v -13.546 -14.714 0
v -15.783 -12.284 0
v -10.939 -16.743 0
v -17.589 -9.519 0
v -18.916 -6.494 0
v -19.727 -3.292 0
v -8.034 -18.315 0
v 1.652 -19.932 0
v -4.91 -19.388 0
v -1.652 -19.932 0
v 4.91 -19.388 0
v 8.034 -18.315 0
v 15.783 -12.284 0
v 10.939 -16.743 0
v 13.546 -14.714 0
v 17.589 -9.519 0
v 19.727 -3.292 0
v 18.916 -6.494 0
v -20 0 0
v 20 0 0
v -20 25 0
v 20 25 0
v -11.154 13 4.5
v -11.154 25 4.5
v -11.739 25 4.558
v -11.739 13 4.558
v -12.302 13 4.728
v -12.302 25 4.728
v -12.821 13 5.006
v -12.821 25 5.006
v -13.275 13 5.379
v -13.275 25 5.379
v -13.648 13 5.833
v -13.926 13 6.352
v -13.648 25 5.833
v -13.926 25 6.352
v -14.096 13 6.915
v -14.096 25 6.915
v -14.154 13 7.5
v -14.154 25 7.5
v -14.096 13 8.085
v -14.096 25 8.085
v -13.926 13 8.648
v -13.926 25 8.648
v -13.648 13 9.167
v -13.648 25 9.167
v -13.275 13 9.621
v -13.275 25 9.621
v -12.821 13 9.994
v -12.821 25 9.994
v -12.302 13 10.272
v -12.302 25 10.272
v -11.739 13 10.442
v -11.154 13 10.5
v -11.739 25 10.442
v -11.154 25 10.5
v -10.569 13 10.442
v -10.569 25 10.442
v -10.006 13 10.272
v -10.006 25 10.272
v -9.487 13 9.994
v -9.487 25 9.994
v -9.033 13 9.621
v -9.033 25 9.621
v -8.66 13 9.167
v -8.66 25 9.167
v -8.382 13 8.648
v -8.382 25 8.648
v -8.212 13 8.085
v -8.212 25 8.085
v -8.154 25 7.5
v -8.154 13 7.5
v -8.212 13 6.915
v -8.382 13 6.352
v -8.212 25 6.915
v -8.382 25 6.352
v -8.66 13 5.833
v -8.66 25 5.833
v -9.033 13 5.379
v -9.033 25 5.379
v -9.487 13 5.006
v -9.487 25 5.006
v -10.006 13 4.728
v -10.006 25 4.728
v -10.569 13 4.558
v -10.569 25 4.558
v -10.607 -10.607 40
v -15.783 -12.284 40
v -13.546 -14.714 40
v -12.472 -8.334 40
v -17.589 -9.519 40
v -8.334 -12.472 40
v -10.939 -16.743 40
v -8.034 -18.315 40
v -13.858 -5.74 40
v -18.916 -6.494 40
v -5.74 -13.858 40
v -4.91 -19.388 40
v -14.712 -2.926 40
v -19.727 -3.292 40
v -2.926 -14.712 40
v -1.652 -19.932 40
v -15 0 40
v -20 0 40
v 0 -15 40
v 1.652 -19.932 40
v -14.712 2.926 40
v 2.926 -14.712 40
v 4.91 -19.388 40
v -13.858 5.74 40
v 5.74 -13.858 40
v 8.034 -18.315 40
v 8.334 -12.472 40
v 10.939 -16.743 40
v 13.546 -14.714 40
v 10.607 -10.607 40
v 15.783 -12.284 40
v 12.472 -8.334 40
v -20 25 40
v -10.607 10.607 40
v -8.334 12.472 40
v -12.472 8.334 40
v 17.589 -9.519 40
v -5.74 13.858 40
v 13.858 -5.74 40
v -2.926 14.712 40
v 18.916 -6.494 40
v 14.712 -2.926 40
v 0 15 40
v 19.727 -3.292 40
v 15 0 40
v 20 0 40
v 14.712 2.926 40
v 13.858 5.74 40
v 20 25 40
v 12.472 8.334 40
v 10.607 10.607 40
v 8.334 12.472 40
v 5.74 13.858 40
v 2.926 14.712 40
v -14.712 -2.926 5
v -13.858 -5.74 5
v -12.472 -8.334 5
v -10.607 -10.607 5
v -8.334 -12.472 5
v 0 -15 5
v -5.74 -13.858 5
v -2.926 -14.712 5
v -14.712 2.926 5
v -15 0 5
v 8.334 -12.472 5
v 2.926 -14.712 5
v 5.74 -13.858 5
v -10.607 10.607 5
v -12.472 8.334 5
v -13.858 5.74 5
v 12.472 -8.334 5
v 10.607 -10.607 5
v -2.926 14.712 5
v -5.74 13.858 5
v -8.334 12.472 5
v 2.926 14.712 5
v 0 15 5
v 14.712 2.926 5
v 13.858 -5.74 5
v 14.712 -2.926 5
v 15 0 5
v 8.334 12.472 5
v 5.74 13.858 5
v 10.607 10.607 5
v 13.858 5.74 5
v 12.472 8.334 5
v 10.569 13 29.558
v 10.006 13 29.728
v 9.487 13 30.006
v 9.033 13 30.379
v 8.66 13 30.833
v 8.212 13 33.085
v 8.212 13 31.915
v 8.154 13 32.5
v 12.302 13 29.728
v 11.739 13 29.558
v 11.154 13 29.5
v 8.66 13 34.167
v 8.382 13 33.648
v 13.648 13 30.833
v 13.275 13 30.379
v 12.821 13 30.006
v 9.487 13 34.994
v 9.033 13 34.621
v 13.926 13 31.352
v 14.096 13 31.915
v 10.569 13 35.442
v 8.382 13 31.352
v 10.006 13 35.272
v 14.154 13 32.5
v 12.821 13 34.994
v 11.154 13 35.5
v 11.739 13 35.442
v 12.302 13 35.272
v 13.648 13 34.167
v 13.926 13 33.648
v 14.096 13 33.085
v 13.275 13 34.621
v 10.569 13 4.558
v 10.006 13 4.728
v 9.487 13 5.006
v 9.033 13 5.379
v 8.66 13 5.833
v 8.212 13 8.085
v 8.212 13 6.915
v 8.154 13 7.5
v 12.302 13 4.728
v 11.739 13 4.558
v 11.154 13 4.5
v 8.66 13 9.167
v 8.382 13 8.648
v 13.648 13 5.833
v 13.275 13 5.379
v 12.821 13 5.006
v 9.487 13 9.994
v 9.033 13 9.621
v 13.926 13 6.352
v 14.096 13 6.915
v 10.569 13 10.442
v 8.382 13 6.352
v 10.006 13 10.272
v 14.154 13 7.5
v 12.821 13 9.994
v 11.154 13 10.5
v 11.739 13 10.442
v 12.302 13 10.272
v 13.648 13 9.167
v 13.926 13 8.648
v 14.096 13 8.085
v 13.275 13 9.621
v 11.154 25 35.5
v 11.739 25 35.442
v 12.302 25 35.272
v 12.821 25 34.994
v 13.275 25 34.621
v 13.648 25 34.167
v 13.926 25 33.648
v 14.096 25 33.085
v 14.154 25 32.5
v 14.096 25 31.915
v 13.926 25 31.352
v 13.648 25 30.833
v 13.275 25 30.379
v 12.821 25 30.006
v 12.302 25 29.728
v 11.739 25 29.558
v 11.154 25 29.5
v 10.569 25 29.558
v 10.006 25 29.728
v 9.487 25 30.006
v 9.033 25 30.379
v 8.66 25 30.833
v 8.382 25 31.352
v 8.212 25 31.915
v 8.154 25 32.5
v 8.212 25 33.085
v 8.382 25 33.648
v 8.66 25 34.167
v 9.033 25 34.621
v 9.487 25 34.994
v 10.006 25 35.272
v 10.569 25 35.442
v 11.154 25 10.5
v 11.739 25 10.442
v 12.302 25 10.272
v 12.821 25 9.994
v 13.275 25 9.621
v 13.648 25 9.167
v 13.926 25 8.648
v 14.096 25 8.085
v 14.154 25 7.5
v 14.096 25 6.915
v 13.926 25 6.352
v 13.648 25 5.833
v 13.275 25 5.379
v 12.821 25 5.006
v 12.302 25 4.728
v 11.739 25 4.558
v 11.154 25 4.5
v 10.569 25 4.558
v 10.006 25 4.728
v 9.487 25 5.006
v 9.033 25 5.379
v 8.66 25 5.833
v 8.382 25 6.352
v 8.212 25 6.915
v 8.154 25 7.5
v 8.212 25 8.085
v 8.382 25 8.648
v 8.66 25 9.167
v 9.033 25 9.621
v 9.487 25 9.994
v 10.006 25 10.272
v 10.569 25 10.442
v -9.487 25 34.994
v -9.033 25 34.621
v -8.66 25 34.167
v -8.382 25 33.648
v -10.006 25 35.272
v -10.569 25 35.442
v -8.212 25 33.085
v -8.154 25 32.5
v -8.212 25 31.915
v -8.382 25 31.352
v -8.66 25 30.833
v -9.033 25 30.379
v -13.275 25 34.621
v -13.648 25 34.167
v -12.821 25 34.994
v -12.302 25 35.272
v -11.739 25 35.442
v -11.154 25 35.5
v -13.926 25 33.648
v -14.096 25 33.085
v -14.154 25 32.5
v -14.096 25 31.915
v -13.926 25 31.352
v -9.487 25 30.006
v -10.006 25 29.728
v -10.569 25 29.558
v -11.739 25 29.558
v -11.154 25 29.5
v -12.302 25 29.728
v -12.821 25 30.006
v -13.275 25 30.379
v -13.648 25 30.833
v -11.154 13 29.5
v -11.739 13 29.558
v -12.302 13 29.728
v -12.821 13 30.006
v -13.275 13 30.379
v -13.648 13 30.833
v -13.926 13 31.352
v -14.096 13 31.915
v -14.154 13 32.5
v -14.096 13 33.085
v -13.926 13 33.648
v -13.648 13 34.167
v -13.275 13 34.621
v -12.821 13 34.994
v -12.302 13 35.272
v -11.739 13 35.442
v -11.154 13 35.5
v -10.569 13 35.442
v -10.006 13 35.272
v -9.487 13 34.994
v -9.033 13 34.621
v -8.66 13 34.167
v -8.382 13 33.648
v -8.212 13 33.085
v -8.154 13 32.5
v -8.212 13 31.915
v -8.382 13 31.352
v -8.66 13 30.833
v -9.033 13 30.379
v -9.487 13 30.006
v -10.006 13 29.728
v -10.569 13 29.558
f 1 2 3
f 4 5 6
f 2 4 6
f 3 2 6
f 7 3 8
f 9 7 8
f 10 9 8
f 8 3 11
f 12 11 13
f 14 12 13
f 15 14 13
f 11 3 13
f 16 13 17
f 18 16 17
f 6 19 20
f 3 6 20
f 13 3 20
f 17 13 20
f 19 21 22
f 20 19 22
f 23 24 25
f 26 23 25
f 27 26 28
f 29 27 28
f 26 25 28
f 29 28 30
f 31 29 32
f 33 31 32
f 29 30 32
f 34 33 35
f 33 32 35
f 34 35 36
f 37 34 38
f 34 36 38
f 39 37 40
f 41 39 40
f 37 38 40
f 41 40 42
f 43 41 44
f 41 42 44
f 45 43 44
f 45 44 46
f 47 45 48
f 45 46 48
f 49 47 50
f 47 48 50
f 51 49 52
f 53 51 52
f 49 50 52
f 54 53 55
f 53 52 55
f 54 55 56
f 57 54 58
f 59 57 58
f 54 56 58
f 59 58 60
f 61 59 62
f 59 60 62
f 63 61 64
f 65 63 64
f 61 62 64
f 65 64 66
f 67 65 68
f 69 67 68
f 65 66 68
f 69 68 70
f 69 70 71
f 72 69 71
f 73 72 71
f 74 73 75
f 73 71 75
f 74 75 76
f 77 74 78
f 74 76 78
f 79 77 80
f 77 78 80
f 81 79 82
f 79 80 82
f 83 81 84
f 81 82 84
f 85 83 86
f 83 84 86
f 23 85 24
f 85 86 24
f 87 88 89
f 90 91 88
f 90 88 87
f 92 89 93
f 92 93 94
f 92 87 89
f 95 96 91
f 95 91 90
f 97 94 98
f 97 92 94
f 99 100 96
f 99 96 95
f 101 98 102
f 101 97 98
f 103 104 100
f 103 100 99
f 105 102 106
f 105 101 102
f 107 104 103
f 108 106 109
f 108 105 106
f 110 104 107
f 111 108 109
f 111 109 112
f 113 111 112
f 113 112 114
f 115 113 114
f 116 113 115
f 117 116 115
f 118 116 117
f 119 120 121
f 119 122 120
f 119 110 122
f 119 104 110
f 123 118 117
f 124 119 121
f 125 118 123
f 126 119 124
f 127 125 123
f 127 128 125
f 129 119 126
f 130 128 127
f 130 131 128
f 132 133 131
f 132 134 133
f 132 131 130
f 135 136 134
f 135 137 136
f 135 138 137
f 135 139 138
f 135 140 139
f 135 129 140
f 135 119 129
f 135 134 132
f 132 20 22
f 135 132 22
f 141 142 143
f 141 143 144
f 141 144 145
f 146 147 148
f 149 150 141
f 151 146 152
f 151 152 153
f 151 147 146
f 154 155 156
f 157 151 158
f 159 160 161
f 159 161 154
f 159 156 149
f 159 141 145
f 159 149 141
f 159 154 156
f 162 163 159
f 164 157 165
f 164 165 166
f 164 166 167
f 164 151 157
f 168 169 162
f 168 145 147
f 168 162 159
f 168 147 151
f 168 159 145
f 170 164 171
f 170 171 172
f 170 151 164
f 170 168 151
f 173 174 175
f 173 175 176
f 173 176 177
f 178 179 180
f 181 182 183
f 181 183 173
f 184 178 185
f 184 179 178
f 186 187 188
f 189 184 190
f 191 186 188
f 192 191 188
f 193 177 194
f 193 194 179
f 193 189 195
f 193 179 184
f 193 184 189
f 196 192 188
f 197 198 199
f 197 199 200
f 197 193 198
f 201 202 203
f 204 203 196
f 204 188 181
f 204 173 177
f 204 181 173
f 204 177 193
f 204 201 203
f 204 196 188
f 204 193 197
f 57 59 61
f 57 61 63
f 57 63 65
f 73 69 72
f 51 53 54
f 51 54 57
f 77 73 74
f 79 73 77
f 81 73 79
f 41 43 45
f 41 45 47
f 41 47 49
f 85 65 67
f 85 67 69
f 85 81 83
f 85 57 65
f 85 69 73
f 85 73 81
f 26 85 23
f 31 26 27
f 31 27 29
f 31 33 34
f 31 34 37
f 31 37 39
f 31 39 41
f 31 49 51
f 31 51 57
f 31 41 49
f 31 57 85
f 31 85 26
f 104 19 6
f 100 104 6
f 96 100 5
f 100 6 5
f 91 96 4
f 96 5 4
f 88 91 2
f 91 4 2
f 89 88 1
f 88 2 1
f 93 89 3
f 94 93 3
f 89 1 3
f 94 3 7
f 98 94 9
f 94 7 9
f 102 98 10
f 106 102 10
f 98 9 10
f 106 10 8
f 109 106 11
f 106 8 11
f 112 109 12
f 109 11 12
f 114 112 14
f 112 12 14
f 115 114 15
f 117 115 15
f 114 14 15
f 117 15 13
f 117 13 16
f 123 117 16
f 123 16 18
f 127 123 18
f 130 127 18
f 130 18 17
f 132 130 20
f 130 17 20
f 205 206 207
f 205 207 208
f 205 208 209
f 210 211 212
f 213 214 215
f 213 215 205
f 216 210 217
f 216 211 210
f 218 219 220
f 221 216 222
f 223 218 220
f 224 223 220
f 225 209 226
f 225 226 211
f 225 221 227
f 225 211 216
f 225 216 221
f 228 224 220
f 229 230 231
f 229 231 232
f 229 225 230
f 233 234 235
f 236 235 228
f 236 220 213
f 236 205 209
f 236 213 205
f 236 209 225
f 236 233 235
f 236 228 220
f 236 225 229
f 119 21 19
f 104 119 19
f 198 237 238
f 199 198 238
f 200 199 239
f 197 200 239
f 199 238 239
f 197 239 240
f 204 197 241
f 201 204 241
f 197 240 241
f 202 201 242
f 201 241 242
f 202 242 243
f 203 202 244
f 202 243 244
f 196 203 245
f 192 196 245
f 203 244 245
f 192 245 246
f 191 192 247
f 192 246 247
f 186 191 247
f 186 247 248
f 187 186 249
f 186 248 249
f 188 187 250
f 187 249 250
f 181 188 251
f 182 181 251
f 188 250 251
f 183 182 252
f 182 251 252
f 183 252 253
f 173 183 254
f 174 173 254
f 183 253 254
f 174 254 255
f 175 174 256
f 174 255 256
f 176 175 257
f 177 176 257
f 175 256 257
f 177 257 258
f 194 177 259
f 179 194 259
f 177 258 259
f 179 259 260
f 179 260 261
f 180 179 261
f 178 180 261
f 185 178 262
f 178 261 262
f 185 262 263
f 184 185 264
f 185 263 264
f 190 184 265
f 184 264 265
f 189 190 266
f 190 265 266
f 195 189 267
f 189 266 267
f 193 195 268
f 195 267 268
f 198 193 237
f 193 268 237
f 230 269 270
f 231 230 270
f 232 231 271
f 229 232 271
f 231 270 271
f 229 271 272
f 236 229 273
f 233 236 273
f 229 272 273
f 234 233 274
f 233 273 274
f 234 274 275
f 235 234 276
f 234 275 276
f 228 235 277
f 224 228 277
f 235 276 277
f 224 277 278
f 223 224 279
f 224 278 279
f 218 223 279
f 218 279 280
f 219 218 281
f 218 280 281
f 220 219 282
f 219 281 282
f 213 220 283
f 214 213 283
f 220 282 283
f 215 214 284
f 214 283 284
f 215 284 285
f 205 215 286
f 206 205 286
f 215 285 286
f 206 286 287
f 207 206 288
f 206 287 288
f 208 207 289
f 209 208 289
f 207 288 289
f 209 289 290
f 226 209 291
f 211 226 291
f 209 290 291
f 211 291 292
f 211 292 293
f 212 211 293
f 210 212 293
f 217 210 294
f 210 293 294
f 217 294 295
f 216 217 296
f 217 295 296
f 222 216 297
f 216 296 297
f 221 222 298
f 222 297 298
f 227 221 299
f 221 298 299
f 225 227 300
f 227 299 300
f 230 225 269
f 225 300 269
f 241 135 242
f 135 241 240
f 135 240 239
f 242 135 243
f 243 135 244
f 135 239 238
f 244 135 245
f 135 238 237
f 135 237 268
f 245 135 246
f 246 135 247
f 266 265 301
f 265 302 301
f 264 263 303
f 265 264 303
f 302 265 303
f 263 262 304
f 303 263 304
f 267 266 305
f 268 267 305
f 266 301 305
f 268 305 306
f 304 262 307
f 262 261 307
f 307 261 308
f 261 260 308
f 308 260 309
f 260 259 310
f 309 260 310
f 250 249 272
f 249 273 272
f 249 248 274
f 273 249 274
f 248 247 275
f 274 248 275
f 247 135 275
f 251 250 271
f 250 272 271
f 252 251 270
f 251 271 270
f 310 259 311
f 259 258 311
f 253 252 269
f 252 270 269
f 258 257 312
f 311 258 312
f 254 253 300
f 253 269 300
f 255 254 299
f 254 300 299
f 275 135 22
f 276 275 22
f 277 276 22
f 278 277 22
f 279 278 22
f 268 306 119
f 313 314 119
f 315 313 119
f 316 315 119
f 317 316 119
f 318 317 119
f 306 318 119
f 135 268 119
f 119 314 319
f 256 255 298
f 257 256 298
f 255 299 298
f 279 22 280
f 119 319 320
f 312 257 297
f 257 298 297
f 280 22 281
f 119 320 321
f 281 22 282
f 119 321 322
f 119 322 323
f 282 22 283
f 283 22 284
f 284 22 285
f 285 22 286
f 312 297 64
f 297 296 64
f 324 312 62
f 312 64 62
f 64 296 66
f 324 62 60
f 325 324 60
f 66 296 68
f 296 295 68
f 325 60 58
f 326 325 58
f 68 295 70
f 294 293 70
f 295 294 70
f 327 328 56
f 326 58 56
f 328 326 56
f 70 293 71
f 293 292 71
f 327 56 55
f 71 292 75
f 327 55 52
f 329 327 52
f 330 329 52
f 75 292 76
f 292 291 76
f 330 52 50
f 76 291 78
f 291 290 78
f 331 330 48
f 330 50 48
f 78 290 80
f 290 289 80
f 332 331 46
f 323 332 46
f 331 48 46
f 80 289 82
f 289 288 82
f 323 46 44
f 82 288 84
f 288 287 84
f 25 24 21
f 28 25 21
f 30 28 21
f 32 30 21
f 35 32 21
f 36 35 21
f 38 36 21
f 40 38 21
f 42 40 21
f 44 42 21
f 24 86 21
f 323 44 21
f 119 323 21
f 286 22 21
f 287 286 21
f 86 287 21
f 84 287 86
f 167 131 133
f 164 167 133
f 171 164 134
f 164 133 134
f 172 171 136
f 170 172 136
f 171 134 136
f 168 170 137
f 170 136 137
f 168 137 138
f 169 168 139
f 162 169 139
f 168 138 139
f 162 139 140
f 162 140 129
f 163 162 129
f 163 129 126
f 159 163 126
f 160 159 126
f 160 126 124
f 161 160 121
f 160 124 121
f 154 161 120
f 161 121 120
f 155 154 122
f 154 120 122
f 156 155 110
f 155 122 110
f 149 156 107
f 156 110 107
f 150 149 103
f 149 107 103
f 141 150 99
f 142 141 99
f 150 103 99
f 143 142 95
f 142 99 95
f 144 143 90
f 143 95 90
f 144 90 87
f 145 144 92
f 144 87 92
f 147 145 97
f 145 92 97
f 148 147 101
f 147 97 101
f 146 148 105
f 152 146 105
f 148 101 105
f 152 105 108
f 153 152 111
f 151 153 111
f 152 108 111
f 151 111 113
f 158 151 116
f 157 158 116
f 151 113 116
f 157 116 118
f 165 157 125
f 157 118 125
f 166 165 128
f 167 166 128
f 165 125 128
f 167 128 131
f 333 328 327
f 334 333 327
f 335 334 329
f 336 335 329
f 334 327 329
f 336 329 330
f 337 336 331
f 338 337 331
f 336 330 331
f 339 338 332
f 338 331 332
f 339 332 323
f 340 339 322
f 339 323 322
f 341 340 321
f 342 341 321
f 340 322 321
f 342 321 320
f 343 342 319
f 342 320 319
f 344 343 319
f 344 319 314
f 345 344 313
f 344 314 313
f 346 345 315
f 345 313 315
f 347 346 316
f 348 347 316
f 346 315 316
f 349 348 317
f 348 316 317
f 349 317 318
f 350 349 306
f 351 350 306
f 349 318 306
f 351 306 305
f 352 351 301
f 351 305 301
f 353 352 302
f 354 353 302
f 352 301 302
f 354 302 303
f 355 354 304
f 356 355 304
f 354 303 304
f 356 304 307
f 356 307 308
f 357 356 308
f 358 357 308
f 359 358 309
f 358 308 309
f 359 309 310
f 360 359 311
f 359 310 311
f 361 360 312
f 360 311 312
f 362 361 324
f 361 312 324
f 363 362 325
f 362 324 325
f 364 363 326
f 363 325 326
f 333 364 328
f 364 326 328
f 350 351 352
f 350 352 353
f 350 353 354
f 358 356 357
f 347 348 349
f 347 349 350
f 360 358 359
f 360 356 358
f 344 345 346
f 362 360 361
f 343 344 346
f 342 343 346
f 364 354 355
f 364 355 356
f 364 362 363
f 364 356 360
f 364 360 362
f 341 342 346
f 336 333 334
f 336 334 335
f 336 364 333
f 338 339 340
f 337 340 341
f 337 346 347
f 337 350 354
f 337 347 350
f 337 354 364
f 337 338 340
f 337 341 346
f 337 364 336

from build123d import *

# Parameters (mm, degrees)
EXTRUDE_1_DEPTH     = 40
SKETCH_2_R          = 15
CUT_EXTRUDE_1_DEPTH = 35
SKETCH_3_R          = 3
CUT_EXTRUDE_2_DEPTH = 12


with BuildPart() as part:
    # 草图1 → 凸台-拉伸1 (new body)
    with BuildSketch(Plane.XY):
        with BuildLine():
            Line((20, 25), (-20, 25))
            Line((-20, 25), (-20, 0))
            ThreePointArc((-20, 0), (0, -20), (20, 0))
            Line((20, 0), (20, 25))
        make_face()
    extrude(amount=EXTRUDE_1_DEPTH)

    # 草图2 → 切除-拉伸1 (cut)
    with BuildSketch(Plane.XY.offset(40)):
        Circle(SKETCH_2_R)
    extrude(amount=-CUT_EXTRUDE_1_DEPTH, mode=Mode.SUBTRACT)

    # 草图3 → 切除-拉伸2 (cut)
    with BuildSketch(Plane(origin=(0, 25, 0), x_dir=(1, 0, 0), z_dir=(0, 1, 0))):
        with Locations(Location((11.153964198, -7.5, 0), (0, 0, 270))):
            Circle(SKETCH_3_R)
        with Locations(Location((-11.153964198, -7.5, 0), (0, 0, 90))):
            Circle(SKETCH_3_R)
        with Locations(Location((11.153964198, -32.5, 0), (0, 0, 270))):
            Circle(SKETCH_3_R)
        with Locations(Location((-11.153964198, -32.5, 0), (0, 0, 90))):
            Circle(SKETCH_3_R)
    extrude(amount=-CUT_EXTRUDE_2_DEPTH, mode=Mode.SUBTRACT)


solid = part.part
